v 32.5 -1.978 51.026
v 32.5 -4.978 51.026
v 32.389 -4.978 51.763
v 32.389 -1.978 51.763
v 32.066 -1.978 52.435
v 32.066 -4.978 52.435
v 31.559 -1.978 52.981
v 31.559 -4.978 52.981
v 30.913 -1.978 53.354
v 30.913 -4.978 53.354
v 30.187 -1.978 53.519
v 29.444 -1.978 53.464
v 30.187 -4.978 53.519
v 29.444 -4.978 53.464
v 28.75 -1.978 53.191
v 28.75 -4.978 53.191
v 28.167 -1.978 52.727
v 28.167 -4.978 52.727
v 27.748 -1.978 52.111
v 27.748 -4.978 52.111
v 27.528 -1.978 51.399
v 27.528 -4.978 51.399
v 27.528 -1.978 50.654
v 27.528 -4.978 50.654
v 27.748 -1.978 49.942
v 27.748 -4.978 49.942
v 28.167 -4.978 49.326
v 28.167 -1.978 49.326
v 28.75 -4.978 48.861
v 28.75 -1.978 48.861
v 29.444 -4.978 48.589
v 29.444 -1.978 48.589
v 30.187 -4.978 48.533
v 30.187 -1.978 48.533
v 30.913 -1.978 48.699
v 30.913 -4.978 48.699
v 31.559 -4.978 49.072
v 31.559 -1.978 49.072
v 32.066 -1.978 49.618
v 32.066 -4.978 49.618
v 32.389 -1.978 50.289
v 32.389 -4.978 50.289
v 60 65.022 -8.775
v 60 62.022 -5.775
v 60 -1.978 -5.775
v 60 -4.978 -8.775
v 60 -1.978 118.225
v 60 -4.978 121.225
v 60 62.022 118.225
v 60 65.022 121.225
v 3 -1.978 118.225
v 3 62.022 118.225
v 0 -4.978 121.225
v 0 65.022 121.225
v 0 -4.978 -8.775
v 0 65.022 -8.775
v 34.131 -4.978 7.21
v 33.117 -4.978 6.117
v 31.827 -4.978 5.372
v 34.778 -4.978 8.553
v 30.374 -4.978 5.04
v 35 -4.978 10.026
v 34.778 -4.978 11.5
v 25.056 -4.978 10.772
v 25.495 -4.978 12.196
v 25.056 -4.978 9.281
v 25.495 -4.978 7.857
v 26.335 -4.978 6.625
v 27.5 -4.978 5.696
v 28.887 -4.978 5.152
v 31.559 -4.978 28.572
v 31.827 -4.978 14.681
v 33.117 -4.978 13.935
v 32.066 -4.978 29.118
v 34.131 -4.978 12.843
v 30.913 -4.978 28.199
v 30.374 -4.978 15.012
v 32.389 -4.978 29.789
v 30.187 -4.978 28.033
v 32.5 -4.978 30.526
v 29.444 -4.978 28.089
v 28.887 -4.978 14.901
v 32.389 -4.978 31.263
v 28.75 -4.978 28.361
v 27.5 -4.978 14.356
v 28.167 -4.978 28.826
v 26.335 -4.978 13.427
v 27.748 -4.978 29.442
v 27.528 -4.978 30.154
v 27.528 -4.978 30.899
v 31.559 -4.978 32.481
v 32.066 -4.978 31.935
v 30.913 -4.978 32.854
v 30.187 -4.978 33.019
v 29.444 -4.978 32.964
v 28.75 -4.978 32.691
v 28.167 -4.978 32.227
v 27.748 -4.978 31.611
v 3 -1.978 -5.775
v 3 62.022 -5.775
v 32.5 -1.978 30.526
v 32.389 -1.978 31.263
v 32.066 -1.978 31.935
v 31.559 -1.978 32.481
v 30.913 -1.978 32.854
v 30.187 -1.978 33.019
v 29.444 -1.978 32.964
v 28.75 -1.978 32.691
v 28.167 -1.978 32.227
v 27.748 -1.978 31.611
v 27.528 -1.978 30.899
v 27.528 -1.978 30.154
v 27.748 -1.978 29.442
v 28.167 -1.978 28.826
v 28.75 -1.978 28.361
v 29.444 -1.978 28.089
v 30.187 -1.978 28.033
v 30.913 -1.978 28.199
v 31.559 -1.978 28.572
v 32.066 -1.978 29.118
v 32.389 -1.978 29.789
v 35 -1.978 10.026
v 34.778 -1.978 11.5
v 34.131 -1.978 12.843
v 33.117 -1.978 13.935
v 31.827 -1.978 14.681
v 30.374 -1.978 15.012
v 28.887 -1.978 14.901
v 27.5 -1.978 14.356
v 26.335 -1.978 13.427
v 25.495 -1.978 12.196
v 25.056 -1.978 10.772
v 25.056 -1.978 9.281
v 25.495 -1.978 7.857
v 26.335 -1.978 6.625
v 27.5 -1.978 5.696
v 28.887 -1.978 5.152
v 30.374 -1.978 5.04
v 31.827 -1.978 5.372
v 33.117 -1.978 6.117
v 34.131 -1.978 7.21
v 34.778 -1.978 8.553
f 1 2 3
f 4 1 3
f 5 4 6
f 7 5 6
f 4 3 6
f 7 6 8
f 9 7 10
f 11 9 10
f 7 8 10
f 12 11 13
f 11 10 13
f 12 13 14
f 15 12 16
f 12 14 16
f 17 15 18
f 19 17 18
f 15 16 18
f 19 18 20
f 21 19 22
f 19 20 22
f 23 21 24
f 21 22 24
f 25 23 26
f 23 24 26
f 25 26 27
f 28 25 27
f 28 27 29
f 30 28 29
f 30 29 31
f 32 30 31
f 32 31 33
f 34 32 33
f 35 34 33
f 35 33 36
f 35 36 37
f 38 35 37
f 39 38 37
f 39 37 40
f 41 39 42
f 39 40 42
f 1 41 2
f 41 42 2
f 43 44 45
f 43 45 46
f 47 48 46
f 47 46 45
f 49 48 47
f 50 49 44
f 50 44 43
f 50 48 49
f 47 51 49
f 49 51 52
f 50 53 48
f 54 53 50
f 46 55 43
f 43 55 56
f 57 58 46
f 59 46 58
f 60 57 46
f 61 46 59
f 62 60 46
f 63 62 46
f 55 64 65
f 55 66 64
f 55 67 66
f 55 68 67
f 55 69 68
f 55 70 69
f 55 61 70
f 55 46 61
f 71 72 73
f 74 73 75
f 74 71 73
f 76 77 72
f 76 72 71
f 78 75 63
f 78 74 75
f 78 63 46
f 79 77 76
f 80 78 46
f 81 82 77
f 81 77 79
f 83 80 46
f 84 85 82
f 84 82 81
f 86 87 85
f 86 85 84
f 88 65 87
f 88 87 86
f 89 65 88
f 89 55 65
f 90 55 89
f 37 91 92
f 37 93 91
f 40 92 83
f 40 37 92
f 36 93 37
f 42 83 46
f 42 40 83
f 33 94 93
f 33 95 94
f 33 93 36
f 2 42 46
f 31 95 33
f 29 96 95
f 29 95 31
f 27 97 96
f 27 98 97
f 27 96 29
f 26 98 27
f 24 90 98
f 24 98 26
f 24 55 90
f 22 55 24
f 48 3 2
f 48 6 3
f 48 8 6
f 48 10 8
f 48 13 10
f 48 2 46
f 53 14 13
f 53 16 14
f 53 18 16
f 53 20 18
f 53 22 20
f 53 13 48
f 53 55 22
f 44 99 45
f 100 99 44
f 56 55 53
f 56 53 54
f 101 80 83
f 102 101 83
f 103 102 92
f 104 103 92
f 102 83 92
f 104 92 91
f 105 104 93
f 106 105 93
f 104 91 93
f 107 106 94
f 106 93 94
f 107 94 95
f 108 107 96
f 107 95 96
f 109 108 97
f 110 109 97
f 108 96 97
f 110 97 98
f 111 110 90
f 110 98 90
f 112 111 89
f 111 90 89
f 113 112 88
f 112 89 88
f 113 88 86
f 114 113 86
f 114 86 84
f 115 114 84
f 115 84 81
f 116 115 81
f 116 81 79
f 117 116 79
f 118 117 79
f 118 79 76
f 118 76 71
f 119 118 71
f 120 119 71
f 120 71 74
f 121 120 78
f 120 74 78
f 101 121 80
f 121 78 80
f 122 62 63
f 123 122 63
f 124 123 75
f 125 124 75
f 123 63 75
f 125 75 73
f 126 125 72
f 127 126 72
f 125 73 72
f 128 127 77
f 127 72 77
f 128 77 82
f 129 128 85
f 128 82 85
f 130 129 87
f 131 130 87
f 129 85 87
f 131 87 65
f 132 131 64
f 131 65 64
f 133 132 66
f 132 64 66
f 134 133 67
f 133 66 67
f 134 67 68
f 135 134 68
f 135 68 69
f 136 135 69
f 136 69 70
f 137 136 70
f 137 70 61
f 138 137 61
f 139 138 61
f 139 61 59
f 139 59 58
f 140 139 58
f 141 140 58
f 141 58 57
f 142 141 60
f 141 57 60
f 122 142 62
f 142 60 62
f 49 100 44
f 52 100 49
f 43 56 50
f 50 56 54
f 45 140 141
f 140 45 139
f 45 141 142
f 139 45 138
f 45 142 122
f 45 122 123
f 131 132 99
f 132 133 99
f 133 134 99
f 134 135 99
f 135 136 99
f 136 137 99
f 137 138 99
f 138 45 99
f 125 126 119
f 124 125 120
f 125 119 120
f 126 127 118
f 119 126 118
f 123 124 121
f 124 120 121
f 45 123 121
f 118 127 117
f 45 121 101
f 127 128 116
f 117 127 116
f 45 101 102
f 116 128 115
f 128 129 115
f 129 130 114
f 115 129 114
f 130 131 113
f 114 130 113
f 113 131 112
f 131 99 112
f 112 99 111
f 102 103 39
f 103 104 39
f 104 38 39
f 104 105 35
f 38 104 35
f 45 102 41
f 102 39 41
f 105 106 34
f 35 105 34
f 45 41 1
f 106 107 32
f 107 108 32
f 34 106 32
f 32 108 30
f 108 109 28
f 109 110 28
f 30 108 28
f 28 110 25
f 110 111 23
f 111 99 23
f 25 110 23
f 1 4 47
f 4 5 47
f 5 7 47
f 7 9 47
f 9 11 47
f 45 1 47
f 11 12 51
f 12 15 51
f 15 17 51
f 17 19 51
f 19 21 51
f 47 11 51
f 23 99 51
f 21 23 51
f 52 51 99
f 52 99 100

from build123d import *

# Parameters (mm, degrees)
F0_W     = 70
F0_H     = 130
F1_DEPTH = 60
F2_T     = -3
F3_R     = 5
F3_R_2   = 2.5
F4_DEPTH = 3


with BuildPart() as f1:
    # F0 (on Right) → F1 (new body)
    with BuildSketch(Plane.YZ):
        with Locations((30.021758, 56.224507)):
            Rectangle(F0_W, F0_H)
    extrude(amount=F1_DEPTH)

    # F2
    f2_openings = [f1.faces().sort_by_distance(p)[0] for p in [
        (60, 30.021758, 56.224507),
    ]]
    offset(amount=F2_T, openings=f2_openings)

    # F3 (on face) → F4 (cut, through all)
    with BuildSketch(Plane.XZ.offset(4.978242)):
        with Locations((30, 10.026326)):
            Circle(F3_R)
        with Locations((30, 30.526326)):
            Circle(F3_R_2)
        with Locations((30, 51.026326)):
            Circle(F3_R_2)
    extrude(amount=-F4_DEPTH, mode=Mode.SUBTRACT)


solid = f1.part
